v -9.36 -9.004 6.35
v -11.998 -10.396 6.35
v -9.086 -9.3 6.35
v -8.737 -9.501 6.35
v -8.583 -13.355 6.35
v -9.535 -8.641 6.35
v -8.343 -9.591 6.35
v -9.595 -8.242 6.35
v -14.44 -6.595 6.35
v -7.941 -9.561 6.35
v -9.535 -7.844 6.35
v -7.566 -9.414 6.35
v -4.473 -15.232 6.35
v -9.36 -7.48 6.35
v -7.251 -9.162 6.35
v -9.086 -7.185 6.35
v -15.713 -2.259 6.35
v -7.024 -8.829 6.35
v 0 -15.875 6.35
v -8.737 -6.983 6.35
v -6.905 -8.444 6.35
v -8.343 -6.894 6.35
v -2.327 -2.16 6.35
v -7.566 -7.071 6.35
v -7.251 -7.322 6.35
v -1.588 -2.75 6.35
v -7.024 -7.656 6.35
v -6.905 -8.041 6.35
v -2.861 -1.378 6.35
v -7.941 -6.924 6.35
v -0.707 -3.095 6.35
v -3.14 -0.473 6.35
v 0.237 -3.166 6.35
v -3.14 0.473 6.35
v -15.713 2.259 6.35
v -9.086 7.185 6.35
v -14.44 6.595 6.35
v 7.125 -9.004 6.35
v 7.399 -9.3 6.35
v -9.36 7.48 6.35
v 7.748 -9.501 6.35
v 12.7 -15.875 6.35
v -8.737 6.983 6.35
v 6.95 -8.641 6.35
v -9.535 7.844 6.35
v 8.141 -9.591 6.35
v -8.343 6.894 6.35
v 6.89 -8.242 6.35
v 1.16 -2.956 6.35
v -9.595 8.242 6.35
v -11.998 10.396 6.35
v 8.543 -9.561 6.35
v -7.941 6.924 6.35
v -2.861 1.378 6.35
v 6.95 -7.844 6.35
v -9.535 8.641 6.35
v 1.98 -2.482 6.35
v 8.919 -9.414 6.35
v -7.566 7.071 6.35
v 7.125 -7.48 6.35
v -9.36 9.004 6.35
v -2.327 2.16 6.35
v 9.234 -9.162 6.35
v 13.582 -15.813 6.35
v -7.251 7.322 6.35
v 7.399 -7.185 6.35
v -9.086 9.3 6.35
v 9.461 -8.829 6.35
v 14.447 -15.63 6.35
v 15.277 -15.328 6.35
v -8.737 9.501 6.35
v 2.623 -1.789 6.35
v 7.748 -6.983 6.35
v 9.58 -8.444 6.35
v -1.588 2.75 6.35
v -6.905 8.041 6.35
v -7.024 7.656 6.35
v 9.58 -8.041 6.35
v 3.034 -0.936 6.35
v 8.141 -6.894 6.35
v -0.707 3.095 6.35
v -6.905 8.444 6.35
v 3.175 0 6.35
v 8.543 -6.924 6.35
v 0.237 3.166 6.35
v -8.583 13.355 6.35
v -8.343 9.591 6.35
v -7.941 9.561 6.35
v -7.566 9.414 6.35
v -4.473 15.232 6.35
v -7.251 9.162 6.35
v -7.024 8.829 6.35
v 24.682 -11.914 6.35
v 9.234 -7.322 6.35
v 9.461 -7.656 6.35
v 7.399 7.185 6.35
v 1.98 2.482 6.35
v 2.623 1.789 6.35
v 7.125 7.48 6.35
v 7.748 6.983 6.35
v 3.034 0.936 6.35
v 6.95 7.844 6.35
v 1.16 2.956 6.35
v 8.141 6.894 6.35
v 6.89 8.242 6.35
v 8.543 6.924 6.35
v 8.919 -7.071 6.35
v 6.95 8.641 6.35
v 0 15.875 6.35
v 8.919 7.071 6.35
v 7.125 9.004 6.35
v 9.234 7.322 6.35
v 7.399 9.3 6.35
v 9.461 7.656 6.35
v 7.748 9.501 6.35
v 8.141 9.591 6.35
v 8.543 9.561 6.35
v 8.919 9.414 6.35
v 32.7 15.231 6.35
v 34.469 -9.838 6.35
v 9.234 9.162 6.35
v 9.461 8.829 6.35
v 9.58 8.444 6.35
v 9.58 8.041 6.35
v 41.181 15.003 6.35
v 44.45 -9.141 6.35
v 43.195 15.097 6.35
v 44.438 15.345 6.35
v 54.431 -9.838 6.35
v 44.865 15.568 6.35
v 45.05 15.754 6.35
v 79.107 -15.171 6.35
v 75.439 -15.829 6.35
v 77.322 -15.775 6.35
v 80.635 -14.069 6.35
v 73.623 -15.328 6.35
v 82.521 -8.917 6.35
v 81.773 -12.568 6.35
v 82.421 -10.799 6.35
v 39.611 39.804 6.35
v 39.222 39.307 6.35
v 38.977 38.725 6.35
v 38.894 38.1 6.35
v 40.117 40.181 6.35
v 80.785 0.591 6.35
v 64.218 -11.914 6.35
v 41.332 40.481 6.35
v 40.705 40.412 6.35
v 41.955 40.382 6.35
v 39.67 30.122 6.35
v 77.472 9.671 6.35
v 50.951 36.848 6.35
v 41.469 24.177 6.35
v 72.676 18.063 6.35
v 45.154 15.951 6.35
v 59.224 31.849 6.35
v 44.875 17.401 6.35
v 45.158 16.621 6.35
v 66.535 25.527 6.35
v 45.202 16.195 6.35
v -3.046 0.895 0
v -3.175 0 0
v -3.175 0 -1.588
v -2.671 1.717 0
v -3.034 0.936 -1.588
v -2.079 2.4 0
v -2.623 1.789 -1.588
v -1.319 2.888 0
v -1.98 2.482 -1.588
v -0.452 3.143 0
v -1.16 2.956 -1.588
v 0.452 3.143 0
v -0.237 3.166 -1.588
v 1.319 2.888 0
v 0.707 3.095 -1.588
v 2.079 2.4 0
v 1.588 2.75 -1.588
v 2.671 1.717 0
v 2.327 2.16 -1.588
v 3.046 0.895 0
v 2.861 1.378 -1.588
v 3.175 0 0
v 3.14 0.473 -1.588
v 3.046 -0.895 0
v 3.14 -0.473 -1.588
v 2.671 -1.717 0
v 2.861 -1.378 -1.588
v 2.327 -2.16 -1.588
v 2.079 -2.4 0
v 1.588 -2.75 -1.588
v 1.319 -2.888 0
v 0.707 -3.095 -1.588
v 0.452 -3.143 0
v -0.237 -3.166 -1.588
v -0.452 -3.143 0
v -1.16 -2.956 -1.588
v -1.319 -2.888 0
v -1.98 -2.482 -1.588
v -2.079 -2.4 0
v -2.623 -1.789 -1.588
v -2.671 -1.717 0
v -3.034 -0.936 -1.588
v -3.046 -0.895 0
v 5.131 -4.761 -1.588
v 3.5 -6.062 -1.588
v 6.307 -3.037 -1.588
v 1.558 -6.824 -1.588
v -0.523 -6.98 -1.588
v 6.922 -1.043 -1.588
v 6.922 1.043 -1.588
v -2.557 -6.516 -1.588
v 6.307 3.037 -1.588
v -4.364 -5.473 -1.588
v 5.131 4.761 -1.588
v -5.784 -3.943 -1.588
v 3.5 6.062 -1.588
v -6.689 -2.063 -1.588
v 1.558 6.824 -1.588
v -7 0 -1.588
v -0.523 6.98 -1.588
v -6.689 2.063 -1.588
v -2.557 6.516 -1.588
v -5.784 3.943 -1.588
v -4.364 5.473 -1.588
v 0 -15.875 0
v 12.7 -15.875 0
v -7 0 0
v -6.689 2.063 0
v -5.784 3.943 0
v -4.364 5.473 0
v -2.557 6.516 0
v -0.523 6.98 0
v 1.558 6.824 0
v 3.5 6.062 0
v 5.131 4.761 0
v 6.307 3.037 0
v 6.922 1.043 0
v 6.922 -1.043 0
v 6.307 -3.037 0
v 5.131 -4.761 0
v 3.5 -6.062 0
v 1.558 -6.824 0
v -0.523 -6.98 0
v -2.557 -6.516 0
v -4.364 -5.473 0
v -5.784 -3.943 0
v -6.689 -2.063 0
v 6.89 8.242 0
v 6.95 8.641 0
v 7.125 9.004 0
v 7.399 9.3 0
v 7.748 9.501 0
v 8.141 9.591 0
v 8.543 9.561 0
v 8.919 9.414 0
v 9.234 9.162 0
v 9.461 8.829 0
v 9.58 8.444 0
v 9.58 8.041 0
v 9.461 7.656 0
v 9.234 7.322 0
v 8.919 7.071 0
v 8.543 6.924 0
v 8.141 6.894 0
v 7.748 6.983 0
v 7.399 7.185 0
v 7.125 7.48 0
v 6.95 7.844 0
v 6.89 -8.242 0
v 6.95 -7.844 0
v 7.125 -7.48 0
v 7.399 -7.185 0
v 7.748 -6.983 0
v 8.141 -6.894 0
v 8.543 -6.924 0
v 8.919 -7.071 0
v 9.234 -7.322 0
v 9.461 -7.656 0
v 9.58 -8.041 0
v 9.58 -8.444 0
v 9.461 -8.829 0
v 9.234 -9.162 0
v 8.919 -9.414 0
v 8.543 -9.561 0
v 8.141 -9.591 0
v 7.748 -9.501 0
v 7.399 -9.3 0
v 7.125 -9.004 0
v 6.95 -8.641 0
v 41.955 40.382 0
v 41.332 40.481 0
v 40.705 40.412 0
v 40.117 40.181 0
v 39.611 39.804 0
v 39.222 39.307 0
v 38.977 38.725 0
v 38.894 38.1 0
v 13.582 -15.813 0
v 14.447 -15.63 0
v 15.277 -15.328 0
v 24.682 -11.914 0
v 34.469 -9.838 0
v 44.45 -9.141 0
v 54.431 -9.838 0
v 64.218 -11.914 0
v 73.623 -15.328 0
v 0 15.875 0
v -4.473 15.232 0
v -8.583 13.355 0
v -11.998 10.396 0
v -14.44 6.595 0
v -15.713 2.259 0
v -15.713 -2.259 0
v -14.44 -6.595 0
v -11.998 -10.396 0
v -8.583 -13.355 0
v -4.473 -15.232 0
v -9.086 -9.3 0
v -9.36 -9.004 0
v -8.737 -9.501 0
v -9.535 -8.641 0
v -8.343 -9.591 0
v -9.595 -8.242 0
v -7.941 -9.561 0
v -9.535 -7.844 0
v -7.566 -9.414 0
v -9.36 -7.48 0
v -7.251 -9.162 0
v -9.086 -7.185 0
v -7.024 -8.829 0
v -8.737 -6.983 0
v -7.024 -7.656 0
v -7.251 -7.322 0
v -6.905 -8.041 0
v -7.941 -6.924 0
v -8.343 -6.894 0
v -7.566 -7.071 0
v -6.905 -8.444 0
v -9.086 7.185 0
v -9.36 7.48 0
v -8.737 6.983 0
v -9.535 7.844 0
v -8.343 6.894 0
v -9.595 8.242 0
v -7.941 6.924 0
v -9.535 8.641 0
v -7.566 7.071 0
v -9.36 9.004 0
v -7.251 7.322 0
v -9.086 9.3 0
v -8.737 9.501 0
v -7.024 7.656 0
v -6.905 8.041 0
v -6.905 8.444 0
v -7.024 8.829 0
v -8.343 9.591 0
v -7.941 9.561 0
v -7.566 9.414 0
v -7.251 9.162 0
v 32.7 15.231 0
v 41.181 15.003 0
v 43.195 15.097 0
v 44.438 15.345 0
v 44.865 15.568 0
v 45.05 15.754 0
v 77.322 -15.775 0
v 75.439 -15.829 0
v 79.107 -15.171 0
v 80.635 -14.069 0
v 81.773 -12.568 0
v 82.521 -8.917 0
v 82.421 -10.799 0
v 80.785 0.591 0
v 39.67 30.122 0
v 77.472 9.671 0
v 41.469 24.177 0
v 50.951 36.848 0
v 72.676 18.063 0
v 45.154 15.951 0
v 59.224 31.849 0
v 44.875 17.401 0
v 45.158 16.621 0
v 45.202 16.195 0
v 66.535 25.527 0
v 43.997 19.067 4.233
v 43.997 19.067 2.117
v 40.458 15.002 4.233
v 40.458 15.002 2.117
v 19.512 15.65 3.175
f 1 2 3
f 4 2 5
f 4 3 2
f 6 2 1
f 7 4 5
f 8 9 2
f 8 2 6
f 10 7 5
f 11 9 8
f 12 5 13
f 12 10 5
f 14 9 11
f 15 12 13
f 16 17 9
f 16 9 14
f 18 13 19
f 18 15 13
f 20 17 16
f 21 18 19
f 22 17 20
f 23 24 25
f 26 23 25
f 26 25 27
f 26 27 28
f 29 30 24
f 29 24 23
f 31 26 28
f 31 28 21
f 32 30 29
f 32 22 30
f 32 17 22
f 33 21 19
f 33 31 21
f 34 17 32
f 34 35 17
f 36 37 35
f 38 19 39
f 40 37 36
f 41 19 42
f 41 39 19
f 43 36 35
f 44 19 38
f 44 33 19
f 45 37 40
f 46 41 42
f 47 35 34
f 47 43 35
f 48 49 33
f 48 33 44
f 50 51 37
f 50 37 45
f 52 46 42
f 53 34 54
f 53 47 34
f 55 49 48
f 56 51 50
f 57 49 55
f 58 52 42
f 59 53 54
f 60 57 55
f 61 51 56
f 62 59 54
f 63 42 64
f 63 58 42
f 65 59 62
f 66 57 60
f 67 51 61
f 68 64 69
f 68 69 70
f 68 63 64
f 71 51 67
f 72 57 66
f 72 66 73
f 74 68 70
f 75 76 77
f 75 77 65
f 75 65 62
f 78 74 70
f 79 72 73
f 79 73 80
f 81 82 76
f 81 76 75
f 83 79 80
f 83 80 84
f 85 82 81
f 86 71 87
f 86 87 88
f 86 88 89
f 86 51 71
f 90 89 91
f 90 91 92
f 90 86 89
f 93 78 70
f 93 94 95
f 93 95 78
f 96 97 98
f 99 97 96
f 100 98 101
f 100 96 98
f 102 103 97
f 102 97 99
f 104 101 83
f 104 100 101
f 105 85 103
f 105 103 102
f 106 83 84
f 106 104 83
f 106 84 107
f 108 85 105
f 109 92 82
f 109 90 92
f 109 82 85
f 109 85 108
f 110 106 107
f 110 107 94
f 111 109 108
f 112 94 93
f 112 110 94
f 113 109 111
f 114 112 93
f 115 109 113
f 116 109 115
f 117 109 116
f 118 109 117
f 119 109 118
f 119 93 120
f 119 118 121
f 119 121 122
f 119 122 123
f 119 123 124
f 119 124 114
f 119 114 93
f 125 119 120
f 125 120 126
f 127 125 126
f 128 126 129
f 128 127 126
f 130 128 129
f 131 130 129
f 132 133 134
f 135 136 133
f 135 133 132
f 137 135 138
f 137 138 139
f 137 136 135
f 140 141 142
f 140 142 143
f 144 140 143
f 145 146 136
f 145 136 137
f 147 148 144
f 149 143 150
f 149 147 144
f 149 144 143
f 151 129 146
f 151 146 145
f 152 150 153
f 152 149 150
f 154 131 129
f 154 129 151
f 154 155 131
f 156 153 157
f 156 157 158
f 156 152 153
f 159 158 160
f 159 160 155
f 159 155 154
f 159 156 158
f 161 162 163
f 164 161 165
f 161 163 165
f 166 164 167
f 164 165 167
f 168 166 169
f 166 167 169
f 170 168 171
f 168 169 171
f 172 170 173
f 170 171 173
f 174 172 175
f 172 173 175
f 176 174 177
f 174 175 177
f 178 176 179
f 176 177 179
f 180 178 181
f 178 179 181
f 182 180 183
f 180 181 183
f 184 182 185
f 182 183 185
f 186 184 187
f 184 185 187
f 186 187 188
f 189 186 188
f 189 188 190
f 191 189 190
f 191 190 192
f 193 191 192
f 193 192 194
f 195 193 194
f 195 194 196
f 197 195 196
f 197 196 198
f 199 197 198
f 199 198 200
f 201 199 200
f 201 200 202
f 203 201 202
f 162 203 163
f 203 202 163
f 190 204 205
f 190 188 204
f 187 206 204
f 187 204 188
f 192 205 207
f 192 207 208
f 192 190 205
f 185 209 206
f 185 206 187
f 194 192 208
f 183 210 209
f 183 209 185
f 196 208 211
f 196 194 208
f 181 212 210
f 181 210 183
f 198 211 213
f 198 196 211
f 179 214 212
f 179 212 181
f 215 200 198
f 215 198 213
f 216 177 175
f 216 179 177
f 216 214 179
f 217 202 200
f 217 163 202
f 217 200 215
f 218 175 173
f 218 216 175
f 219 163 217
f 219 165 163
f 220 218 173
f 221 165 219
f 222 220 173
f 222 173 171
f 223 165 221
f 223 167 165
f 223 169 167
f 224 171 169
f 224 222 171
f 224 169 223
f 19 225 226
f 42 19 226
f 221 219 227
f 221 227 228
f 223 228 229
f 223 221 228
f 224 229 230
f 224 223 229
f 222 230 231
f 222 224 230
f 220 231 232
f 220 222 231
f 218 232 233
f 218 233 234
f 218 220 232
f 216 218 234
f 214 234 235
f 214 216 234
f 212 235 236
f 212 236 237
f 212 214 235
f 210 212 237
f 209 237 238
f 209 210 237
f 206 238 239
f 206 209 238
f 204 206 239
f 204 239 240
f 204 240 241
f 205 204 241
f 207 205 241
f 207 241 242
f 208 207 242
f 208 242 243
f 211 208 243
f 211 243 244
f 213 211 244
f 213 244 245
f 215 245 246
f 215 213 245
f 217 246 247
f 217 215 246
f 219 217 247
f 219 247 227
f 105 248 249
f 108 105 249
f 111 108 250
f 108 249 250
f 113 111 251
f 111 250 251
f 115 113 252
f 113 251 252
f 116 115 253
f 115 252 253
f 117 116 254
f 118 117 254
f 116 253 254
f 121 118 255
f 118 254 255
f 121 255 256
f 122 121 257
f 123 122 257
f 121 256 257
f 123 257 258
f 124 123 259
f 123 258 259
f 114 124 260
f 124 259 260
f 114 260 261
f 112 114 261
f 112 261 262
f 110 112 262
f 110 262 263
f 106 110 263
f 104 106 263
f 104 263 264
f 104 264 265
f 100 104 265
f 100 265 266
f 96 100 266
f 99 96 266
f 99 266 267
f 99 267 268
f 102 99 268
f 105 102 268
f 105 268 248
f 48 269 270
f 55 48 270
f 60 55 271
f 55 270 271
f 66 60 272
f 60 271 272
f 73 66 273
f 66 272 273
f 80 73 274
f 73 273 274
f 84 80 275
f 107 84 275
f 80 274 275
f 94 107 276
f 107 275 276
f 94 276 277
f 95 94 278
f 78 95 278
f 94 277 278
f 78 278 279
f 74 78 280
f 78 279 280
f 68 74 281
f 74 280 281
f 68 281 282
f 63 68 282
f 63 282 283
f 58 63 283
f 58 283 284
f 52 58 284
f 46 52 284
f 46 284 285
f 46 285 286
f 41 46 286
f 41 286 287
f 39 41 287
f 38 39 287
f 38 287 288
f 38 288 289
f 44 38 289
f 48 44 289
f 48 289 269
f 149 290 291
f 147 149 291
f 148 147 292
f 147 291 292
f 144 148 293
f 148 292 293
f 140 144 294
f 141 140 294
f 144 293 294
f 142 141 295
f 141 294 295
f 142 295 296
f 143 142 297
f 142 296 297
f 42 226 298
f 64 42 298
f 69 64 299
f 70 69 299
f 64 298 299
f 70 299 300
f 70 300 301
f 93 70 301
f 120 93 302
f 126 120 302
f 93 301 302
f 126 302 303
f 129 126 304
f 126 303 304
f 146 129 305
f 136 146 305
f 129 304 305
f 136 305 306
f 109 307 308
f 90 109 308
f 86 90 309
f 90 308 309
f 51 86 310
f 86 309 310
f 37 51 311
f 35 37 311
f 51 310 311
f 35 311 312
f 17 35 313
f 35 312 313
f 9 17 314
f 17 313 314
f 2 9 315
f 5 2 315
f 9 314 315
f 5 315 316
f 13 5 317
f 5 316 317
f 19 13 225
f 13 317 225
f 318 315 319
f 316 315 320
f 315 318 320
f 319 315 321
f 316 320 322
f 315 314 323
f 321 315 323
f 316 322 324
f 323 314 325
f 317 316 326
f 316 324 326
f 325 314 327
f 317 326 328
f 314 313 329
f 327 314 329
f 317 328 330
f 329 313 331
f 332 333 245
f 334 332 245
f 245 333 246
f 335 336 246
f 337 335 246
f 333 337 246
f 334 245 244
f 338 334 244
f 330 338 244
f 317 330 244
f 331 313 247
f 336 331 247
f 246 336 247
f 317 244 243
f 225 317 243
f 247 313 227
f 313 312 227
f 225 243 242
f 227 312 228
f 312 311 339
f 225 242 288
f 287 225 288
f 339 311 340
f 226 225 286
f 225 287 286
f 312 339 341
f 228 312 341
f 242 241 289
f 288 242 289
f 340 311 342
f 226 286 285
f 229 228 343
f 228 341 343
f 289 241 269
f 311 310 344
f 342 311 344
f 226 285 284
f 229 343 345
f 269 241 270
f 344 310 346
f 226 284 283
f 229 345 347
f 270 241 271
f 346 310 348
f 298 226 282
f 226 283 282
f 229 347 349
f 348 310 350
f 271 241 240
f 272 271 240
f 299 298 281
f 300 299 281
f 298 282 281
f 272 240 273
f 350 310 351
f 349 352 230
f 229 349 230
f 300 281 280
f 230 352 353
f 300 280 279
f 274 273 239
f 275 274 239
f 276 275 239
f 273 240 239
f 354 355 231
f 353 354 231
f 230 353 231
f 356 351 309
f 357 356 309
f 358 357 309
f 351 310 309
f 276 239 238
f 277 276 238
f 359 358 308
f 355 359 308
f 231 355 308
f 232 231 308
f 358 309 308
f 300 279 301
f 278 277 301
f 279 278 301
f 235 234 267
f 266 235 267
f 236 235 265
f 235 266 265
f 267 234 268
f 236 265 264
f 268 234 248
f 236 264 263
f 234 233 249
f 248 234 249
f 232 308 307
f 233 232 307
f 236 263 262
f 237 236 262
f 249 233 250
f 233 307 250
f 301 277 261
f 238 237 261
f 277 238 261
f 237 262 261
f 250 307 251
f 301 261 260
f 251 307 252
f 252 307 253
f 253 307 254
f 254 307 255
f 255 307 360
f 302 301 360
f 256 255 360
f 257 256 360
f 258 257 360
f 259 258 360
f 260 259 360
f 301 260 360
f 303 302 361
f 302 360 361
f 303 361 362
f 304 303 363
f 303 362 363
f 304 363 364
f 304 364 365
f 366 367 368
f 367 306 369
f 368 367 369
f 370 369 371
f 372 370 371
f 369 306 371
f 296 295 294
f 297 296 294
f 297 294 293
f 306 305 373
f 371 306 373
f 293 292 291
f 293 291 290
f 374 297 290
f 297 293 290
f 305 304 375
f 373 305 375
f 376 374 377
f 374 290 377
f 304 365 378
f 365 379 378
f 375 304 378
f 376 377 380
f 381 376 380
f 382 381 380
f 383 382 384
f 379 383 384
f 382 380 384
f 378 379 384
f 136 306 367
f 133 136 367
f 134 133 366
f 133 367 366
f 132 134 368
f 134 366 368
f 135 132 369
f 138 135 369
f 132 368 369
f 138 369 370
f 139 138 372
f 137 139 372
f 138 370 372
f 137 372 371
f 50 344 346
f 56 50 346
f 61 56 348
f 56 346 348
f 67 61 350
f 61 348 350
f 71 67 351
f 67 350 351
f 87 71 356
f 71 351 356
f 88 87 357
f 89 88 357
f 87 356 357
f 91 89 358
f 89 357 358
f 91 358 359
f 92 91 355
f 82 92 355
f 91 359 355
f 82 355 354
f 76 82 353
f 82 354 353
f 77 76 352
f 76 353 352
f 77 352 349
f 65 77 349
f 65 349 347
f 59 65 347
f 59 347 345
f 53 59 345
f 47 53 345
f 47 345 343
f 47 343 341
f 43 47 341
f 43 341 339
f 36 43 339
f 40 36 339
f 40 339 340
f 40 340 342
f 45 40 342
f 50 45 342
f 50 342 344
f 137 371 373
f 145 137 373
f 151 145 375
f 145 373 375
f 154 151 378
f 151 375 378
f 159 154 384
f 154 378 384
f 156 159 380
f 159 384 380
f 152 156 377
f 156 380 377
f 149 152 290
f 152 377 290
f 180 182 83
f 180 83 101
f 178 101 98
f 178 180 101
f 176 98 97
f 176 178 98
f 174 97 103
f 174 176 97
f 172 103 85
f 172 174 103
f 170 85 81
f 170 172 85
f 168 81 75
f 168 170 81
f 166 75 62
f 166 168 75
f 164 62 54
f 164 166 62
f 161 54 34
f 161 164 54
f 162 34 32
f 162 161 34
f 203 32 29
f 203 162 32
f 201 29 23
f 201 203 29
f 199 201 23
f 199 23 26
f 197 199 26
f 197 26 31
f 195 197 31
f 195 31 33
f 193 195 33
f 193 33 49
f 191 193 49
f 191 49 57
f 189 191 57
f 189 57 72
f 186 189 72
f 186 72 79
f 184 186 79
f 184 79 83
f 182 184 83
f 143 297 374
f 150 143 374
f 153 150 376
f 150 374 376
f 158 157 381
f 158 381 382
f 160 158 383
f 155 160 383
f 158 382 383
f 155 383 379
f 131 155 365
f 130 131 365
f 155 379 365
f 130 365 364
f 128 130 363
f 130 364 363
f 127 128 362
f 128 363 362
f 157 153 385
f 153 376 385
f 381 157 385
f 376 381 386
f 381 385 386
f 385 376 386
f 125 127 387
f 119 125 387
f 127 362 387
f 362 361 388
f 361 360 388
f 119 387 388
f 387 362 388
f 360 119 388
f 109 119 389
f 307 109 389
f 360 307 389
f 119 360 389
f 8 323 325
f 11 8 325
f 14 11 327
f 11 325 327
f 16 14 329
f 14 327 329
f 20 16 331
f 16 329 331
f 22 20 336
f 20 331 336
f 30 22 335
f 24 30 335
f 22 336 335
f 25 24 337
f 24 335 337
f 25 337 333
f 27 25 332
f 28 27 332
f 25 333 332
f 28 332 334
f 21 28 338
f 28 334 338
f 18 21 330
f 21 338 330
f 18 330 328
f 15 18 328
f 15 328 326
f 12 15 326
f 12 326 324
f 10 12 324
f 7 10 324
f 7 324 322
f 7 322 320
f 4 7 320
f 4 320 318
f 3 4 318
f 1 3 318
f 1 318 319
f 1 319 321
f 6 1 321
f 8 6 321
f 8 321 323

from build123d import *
from build123d.topology import SkipClean

# Parameters (mm, degrees)
SKETCH1_R             = 3.175
BOSS_EXTRUDE1_DEPTH   = 6.35
F_6_32_TAPPED_HOLE1_D = 2.7051
BOSS_EXTRUDE3_START   = 1.5875
SKETCH5_R             = 7
SKETCH5_R_2           = 3.175
BOSS_EXTRUDE3_DEPTH   = 1.5875


with BuildPart() as part:
    # Sketch1 → Boss-Extrude1 (new body)
    with BuildSketch(Plane.XY):
        with BuildLine():
            Line((0, -15.875), (12.7, -15.875))
            ThreePointArc((12.7, -15.875), (14.017406742, -15.736838655), (15.277486023, -15.328366764))
            ThreePointArc((15.277486023, -15.328366764), (44.45, -9.14146), (73.622513977, -15.328366764))
            ThreePointArc((73.622513977, -15.328366764), (79.912012711, -14.677034708), (82.52084196, -8.917170323))
            ThreePointArc((82.52084196, -8.917170323), (69.763837113, 21.925102015), (41.955075464, 40.382071192))
            ThreePointArc((41.955075464, 40.382071192), (39.851813107, 40.009159666), (38.89375, 38.1))
            add(Edge.make_bspline(
                [(38.89375, 38.1), (38.89375, 8.240619939), (68.342560944, 15.875), (0, 15.875)],
                knots=[0, 0, 0, 0, 1, 1, 1, 1], degree=3))
            ThreePointArc((0, 15.875), (-15.875, 0), (0, -15.875))
        make_face()
        Circle(SKETCH1_R, mode=Mode.SUBTRACT)
    extrude(amount=BOSS_EXTRUDE1_DEPTH)

    # #6-32 Tapped Hole1 (through all)
    with Locations(Plane.XY.offset(6.35)):
        with Locations((8.242390195, 8.242390195), (-8.242390195, 8.242390195), (8.242390195, -8.242390195), (-8.242390195, -8.242390195)):
            Hole(F_6_32_TAPPED_HOLE1_D / 2)

    # Sketch5 → Boss-Extrude3 (add)
    with SkipClean():  # the faces are left unmerged after this step: merging them gives an invalid solid
        with BuildSketch(Plane(origin=(0, 0, 0), x_dir=(-1, 0, 0), z_dir=(0, 0, -1)).offset(BOSS_EXTRUDE3_START)):
            Circle(SKETCH5_R)
            Circle(SKETCH5_R_2, mode=Mode.SUBTRACT)
        extrude(amount=-BOSS_EXTRUDE3_DEPTH)


solid = part.part
